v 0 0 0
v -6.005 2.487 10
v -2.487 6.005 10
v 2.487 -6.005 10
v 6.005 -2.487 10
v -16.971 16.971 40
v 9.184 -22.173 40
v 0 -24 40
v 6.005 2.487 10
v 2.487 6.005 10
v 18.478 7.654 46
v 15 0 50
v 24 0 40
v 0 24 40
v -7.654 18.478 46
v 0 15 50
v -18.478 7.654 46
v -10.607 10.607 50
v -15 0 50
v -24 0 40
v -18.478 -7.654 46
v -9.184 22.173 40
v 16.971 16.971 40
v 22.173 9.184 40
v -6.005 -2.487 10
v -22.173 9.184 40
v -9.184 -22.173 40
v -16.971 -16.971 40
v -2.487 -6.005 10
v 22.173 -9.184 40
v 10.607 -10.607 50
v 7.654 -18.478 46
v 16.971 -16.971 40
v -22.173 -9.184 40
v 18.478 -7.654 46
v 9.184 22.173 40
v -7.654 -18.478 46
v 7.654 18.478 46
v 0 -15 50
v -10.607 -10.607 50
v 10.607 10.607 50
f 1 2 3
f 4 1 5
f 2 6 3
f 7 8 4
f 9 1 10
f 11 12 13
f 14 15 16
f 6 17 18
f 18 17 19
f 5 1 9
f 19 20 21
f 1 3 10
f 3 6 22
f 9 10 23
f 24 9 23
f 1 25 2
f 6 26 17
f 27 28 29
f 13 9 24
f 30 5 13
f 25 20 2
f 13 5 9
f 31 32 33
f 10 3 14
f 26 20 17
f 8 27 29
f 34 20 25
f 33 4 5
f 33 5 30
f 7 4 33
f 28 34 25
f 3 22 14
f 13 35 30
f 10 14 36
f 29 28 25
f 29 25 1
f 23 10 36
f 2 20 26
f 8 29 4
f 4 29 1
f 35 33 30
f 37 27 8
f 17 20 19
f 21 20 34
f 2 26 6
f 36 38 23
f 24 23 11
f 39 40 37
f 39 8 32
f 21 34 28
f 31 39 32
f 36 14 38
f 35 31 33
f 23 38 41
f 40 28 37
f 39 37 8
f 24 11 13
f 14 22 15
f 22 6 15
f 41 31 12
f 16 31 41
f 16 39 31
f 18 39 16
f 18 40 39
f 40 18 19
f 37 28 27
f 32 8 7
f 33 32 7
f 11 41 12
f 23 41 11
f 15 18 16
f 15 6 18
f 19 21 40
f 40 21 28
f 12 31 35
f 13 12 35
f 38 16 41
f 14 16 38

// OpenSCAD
/* scADVENT 202x  -  Diamond  by Ulrich Bär  license:CC0 
 https://creativecommons.org/publicdomain/zero/1.0/
 
 
 Today we learn how to model a Diamond
 */

/*[Diamond]*/

//name=["height","radius","n-gon","delta"];

top= [50,  15,  8,  0];
l1=  [46,  20,  8,  8];
l2=  [40,  24, 16,  0];
l3=  [10, 6.5,  8,  8];
base=[ 0,   0,  1,  0];


info=true;
preset=0; //[0:None, 1:example, 2:Swiss Cut, 3: Rose Cut, 4: Brilliant, 5:Portuguese]



data=[
["top", "l1", "l2", "l3", "base"],
[[50, 10, 6, 0], [45, 20, 12, 6], [40, 22, 24, 0], [36,  22, 12, 12], [0, 2, 6, 0]], // example
[[50, 12, 8, 0], [45, 22,  8, 8], [40, 22, 16, 0], [36,  22,  8,  8], [0, 2, 8, 0]],  // swiss
[[50,  0, 6, 0], [48, 15,  6, 6], [40, 24, 12, 0], [36,  25,  6,  6], [0, 2, 6, 6]], // rose
[[50, 15, 8, 0], [46, 20,  8, 8], [40, 24, 16, 0], [10, 6.5,  8,  8], [0, 0, 1, 0]], // brilliant
concat([for(i=[1:5])[10-pow(i,2.2)/10,pow(i,1.0) +2,18, i%2?0:18]],[[0, 1, 18, 0]]) // portuguese
];


parameter=preset?data[preset]:[top, l1, l2, l3, base];

echo(current_parameter=parameter);



Level = function (v)
  let(
  n=v[2]?v[2]:1,
  step  = 360/n,
  delta = v[3]?180/v[3]:0
  )
[
for(i=[0:n-1]) [
  sin(i*step+delta) * v[1],
  cos(i*step+delta) * v[1],
  v[0]
 ]
];


points= [
  for(i=[0:len(parameter)-1])
  each Level(parameter[i])
  ];

// background for topview
if($preview&&!$vpr.x&&!$vpr.y)translate([0,0,-50])color("Ivory")intersection(){
  rotate([-35,-45])cube([1500,1500,1],true);
  cylinder(10000,r=parameter[2][1],center=true,$fn=parameter[2][2]);
}

color("silver",alpha=0.45)
hull()polyhedron(points,[[for(i=[0:len(points)-1])i]]);
 translate([0,0,1]) sphere(.0001);// forcing CGAL for wireframe view F11
  

if(info&&$preview)union(){
  for(i=[0:len(parameter)-1])
   let( rot= -90 + (parameter[i][3]?180/parameter[i][3]:0),
        name= is_undef(name[i])?str("   «—l",i):name[i]
   )
    rotate(rot)
      translate([parameter[i][1], 0, parameter[i][0] ])
        color(pal[i%len(pal)]){
          rotate([0,45])cylinder($vpd/20,r1=0,r2=0.75,$fn=3);
          rotate($vpr-[0,0,rot])text(name,size=$vpd/60,valign="center");
        }



 pal=[
 "pink",
 "lime",
 "lightblue",
 "maroon",
 "crimson"
 ];
 
 name=[
  "  «-top",
  "  «-l1",
  "  «-l2",
  "  «-l3",
  "  «-base"
 
 ];

}
